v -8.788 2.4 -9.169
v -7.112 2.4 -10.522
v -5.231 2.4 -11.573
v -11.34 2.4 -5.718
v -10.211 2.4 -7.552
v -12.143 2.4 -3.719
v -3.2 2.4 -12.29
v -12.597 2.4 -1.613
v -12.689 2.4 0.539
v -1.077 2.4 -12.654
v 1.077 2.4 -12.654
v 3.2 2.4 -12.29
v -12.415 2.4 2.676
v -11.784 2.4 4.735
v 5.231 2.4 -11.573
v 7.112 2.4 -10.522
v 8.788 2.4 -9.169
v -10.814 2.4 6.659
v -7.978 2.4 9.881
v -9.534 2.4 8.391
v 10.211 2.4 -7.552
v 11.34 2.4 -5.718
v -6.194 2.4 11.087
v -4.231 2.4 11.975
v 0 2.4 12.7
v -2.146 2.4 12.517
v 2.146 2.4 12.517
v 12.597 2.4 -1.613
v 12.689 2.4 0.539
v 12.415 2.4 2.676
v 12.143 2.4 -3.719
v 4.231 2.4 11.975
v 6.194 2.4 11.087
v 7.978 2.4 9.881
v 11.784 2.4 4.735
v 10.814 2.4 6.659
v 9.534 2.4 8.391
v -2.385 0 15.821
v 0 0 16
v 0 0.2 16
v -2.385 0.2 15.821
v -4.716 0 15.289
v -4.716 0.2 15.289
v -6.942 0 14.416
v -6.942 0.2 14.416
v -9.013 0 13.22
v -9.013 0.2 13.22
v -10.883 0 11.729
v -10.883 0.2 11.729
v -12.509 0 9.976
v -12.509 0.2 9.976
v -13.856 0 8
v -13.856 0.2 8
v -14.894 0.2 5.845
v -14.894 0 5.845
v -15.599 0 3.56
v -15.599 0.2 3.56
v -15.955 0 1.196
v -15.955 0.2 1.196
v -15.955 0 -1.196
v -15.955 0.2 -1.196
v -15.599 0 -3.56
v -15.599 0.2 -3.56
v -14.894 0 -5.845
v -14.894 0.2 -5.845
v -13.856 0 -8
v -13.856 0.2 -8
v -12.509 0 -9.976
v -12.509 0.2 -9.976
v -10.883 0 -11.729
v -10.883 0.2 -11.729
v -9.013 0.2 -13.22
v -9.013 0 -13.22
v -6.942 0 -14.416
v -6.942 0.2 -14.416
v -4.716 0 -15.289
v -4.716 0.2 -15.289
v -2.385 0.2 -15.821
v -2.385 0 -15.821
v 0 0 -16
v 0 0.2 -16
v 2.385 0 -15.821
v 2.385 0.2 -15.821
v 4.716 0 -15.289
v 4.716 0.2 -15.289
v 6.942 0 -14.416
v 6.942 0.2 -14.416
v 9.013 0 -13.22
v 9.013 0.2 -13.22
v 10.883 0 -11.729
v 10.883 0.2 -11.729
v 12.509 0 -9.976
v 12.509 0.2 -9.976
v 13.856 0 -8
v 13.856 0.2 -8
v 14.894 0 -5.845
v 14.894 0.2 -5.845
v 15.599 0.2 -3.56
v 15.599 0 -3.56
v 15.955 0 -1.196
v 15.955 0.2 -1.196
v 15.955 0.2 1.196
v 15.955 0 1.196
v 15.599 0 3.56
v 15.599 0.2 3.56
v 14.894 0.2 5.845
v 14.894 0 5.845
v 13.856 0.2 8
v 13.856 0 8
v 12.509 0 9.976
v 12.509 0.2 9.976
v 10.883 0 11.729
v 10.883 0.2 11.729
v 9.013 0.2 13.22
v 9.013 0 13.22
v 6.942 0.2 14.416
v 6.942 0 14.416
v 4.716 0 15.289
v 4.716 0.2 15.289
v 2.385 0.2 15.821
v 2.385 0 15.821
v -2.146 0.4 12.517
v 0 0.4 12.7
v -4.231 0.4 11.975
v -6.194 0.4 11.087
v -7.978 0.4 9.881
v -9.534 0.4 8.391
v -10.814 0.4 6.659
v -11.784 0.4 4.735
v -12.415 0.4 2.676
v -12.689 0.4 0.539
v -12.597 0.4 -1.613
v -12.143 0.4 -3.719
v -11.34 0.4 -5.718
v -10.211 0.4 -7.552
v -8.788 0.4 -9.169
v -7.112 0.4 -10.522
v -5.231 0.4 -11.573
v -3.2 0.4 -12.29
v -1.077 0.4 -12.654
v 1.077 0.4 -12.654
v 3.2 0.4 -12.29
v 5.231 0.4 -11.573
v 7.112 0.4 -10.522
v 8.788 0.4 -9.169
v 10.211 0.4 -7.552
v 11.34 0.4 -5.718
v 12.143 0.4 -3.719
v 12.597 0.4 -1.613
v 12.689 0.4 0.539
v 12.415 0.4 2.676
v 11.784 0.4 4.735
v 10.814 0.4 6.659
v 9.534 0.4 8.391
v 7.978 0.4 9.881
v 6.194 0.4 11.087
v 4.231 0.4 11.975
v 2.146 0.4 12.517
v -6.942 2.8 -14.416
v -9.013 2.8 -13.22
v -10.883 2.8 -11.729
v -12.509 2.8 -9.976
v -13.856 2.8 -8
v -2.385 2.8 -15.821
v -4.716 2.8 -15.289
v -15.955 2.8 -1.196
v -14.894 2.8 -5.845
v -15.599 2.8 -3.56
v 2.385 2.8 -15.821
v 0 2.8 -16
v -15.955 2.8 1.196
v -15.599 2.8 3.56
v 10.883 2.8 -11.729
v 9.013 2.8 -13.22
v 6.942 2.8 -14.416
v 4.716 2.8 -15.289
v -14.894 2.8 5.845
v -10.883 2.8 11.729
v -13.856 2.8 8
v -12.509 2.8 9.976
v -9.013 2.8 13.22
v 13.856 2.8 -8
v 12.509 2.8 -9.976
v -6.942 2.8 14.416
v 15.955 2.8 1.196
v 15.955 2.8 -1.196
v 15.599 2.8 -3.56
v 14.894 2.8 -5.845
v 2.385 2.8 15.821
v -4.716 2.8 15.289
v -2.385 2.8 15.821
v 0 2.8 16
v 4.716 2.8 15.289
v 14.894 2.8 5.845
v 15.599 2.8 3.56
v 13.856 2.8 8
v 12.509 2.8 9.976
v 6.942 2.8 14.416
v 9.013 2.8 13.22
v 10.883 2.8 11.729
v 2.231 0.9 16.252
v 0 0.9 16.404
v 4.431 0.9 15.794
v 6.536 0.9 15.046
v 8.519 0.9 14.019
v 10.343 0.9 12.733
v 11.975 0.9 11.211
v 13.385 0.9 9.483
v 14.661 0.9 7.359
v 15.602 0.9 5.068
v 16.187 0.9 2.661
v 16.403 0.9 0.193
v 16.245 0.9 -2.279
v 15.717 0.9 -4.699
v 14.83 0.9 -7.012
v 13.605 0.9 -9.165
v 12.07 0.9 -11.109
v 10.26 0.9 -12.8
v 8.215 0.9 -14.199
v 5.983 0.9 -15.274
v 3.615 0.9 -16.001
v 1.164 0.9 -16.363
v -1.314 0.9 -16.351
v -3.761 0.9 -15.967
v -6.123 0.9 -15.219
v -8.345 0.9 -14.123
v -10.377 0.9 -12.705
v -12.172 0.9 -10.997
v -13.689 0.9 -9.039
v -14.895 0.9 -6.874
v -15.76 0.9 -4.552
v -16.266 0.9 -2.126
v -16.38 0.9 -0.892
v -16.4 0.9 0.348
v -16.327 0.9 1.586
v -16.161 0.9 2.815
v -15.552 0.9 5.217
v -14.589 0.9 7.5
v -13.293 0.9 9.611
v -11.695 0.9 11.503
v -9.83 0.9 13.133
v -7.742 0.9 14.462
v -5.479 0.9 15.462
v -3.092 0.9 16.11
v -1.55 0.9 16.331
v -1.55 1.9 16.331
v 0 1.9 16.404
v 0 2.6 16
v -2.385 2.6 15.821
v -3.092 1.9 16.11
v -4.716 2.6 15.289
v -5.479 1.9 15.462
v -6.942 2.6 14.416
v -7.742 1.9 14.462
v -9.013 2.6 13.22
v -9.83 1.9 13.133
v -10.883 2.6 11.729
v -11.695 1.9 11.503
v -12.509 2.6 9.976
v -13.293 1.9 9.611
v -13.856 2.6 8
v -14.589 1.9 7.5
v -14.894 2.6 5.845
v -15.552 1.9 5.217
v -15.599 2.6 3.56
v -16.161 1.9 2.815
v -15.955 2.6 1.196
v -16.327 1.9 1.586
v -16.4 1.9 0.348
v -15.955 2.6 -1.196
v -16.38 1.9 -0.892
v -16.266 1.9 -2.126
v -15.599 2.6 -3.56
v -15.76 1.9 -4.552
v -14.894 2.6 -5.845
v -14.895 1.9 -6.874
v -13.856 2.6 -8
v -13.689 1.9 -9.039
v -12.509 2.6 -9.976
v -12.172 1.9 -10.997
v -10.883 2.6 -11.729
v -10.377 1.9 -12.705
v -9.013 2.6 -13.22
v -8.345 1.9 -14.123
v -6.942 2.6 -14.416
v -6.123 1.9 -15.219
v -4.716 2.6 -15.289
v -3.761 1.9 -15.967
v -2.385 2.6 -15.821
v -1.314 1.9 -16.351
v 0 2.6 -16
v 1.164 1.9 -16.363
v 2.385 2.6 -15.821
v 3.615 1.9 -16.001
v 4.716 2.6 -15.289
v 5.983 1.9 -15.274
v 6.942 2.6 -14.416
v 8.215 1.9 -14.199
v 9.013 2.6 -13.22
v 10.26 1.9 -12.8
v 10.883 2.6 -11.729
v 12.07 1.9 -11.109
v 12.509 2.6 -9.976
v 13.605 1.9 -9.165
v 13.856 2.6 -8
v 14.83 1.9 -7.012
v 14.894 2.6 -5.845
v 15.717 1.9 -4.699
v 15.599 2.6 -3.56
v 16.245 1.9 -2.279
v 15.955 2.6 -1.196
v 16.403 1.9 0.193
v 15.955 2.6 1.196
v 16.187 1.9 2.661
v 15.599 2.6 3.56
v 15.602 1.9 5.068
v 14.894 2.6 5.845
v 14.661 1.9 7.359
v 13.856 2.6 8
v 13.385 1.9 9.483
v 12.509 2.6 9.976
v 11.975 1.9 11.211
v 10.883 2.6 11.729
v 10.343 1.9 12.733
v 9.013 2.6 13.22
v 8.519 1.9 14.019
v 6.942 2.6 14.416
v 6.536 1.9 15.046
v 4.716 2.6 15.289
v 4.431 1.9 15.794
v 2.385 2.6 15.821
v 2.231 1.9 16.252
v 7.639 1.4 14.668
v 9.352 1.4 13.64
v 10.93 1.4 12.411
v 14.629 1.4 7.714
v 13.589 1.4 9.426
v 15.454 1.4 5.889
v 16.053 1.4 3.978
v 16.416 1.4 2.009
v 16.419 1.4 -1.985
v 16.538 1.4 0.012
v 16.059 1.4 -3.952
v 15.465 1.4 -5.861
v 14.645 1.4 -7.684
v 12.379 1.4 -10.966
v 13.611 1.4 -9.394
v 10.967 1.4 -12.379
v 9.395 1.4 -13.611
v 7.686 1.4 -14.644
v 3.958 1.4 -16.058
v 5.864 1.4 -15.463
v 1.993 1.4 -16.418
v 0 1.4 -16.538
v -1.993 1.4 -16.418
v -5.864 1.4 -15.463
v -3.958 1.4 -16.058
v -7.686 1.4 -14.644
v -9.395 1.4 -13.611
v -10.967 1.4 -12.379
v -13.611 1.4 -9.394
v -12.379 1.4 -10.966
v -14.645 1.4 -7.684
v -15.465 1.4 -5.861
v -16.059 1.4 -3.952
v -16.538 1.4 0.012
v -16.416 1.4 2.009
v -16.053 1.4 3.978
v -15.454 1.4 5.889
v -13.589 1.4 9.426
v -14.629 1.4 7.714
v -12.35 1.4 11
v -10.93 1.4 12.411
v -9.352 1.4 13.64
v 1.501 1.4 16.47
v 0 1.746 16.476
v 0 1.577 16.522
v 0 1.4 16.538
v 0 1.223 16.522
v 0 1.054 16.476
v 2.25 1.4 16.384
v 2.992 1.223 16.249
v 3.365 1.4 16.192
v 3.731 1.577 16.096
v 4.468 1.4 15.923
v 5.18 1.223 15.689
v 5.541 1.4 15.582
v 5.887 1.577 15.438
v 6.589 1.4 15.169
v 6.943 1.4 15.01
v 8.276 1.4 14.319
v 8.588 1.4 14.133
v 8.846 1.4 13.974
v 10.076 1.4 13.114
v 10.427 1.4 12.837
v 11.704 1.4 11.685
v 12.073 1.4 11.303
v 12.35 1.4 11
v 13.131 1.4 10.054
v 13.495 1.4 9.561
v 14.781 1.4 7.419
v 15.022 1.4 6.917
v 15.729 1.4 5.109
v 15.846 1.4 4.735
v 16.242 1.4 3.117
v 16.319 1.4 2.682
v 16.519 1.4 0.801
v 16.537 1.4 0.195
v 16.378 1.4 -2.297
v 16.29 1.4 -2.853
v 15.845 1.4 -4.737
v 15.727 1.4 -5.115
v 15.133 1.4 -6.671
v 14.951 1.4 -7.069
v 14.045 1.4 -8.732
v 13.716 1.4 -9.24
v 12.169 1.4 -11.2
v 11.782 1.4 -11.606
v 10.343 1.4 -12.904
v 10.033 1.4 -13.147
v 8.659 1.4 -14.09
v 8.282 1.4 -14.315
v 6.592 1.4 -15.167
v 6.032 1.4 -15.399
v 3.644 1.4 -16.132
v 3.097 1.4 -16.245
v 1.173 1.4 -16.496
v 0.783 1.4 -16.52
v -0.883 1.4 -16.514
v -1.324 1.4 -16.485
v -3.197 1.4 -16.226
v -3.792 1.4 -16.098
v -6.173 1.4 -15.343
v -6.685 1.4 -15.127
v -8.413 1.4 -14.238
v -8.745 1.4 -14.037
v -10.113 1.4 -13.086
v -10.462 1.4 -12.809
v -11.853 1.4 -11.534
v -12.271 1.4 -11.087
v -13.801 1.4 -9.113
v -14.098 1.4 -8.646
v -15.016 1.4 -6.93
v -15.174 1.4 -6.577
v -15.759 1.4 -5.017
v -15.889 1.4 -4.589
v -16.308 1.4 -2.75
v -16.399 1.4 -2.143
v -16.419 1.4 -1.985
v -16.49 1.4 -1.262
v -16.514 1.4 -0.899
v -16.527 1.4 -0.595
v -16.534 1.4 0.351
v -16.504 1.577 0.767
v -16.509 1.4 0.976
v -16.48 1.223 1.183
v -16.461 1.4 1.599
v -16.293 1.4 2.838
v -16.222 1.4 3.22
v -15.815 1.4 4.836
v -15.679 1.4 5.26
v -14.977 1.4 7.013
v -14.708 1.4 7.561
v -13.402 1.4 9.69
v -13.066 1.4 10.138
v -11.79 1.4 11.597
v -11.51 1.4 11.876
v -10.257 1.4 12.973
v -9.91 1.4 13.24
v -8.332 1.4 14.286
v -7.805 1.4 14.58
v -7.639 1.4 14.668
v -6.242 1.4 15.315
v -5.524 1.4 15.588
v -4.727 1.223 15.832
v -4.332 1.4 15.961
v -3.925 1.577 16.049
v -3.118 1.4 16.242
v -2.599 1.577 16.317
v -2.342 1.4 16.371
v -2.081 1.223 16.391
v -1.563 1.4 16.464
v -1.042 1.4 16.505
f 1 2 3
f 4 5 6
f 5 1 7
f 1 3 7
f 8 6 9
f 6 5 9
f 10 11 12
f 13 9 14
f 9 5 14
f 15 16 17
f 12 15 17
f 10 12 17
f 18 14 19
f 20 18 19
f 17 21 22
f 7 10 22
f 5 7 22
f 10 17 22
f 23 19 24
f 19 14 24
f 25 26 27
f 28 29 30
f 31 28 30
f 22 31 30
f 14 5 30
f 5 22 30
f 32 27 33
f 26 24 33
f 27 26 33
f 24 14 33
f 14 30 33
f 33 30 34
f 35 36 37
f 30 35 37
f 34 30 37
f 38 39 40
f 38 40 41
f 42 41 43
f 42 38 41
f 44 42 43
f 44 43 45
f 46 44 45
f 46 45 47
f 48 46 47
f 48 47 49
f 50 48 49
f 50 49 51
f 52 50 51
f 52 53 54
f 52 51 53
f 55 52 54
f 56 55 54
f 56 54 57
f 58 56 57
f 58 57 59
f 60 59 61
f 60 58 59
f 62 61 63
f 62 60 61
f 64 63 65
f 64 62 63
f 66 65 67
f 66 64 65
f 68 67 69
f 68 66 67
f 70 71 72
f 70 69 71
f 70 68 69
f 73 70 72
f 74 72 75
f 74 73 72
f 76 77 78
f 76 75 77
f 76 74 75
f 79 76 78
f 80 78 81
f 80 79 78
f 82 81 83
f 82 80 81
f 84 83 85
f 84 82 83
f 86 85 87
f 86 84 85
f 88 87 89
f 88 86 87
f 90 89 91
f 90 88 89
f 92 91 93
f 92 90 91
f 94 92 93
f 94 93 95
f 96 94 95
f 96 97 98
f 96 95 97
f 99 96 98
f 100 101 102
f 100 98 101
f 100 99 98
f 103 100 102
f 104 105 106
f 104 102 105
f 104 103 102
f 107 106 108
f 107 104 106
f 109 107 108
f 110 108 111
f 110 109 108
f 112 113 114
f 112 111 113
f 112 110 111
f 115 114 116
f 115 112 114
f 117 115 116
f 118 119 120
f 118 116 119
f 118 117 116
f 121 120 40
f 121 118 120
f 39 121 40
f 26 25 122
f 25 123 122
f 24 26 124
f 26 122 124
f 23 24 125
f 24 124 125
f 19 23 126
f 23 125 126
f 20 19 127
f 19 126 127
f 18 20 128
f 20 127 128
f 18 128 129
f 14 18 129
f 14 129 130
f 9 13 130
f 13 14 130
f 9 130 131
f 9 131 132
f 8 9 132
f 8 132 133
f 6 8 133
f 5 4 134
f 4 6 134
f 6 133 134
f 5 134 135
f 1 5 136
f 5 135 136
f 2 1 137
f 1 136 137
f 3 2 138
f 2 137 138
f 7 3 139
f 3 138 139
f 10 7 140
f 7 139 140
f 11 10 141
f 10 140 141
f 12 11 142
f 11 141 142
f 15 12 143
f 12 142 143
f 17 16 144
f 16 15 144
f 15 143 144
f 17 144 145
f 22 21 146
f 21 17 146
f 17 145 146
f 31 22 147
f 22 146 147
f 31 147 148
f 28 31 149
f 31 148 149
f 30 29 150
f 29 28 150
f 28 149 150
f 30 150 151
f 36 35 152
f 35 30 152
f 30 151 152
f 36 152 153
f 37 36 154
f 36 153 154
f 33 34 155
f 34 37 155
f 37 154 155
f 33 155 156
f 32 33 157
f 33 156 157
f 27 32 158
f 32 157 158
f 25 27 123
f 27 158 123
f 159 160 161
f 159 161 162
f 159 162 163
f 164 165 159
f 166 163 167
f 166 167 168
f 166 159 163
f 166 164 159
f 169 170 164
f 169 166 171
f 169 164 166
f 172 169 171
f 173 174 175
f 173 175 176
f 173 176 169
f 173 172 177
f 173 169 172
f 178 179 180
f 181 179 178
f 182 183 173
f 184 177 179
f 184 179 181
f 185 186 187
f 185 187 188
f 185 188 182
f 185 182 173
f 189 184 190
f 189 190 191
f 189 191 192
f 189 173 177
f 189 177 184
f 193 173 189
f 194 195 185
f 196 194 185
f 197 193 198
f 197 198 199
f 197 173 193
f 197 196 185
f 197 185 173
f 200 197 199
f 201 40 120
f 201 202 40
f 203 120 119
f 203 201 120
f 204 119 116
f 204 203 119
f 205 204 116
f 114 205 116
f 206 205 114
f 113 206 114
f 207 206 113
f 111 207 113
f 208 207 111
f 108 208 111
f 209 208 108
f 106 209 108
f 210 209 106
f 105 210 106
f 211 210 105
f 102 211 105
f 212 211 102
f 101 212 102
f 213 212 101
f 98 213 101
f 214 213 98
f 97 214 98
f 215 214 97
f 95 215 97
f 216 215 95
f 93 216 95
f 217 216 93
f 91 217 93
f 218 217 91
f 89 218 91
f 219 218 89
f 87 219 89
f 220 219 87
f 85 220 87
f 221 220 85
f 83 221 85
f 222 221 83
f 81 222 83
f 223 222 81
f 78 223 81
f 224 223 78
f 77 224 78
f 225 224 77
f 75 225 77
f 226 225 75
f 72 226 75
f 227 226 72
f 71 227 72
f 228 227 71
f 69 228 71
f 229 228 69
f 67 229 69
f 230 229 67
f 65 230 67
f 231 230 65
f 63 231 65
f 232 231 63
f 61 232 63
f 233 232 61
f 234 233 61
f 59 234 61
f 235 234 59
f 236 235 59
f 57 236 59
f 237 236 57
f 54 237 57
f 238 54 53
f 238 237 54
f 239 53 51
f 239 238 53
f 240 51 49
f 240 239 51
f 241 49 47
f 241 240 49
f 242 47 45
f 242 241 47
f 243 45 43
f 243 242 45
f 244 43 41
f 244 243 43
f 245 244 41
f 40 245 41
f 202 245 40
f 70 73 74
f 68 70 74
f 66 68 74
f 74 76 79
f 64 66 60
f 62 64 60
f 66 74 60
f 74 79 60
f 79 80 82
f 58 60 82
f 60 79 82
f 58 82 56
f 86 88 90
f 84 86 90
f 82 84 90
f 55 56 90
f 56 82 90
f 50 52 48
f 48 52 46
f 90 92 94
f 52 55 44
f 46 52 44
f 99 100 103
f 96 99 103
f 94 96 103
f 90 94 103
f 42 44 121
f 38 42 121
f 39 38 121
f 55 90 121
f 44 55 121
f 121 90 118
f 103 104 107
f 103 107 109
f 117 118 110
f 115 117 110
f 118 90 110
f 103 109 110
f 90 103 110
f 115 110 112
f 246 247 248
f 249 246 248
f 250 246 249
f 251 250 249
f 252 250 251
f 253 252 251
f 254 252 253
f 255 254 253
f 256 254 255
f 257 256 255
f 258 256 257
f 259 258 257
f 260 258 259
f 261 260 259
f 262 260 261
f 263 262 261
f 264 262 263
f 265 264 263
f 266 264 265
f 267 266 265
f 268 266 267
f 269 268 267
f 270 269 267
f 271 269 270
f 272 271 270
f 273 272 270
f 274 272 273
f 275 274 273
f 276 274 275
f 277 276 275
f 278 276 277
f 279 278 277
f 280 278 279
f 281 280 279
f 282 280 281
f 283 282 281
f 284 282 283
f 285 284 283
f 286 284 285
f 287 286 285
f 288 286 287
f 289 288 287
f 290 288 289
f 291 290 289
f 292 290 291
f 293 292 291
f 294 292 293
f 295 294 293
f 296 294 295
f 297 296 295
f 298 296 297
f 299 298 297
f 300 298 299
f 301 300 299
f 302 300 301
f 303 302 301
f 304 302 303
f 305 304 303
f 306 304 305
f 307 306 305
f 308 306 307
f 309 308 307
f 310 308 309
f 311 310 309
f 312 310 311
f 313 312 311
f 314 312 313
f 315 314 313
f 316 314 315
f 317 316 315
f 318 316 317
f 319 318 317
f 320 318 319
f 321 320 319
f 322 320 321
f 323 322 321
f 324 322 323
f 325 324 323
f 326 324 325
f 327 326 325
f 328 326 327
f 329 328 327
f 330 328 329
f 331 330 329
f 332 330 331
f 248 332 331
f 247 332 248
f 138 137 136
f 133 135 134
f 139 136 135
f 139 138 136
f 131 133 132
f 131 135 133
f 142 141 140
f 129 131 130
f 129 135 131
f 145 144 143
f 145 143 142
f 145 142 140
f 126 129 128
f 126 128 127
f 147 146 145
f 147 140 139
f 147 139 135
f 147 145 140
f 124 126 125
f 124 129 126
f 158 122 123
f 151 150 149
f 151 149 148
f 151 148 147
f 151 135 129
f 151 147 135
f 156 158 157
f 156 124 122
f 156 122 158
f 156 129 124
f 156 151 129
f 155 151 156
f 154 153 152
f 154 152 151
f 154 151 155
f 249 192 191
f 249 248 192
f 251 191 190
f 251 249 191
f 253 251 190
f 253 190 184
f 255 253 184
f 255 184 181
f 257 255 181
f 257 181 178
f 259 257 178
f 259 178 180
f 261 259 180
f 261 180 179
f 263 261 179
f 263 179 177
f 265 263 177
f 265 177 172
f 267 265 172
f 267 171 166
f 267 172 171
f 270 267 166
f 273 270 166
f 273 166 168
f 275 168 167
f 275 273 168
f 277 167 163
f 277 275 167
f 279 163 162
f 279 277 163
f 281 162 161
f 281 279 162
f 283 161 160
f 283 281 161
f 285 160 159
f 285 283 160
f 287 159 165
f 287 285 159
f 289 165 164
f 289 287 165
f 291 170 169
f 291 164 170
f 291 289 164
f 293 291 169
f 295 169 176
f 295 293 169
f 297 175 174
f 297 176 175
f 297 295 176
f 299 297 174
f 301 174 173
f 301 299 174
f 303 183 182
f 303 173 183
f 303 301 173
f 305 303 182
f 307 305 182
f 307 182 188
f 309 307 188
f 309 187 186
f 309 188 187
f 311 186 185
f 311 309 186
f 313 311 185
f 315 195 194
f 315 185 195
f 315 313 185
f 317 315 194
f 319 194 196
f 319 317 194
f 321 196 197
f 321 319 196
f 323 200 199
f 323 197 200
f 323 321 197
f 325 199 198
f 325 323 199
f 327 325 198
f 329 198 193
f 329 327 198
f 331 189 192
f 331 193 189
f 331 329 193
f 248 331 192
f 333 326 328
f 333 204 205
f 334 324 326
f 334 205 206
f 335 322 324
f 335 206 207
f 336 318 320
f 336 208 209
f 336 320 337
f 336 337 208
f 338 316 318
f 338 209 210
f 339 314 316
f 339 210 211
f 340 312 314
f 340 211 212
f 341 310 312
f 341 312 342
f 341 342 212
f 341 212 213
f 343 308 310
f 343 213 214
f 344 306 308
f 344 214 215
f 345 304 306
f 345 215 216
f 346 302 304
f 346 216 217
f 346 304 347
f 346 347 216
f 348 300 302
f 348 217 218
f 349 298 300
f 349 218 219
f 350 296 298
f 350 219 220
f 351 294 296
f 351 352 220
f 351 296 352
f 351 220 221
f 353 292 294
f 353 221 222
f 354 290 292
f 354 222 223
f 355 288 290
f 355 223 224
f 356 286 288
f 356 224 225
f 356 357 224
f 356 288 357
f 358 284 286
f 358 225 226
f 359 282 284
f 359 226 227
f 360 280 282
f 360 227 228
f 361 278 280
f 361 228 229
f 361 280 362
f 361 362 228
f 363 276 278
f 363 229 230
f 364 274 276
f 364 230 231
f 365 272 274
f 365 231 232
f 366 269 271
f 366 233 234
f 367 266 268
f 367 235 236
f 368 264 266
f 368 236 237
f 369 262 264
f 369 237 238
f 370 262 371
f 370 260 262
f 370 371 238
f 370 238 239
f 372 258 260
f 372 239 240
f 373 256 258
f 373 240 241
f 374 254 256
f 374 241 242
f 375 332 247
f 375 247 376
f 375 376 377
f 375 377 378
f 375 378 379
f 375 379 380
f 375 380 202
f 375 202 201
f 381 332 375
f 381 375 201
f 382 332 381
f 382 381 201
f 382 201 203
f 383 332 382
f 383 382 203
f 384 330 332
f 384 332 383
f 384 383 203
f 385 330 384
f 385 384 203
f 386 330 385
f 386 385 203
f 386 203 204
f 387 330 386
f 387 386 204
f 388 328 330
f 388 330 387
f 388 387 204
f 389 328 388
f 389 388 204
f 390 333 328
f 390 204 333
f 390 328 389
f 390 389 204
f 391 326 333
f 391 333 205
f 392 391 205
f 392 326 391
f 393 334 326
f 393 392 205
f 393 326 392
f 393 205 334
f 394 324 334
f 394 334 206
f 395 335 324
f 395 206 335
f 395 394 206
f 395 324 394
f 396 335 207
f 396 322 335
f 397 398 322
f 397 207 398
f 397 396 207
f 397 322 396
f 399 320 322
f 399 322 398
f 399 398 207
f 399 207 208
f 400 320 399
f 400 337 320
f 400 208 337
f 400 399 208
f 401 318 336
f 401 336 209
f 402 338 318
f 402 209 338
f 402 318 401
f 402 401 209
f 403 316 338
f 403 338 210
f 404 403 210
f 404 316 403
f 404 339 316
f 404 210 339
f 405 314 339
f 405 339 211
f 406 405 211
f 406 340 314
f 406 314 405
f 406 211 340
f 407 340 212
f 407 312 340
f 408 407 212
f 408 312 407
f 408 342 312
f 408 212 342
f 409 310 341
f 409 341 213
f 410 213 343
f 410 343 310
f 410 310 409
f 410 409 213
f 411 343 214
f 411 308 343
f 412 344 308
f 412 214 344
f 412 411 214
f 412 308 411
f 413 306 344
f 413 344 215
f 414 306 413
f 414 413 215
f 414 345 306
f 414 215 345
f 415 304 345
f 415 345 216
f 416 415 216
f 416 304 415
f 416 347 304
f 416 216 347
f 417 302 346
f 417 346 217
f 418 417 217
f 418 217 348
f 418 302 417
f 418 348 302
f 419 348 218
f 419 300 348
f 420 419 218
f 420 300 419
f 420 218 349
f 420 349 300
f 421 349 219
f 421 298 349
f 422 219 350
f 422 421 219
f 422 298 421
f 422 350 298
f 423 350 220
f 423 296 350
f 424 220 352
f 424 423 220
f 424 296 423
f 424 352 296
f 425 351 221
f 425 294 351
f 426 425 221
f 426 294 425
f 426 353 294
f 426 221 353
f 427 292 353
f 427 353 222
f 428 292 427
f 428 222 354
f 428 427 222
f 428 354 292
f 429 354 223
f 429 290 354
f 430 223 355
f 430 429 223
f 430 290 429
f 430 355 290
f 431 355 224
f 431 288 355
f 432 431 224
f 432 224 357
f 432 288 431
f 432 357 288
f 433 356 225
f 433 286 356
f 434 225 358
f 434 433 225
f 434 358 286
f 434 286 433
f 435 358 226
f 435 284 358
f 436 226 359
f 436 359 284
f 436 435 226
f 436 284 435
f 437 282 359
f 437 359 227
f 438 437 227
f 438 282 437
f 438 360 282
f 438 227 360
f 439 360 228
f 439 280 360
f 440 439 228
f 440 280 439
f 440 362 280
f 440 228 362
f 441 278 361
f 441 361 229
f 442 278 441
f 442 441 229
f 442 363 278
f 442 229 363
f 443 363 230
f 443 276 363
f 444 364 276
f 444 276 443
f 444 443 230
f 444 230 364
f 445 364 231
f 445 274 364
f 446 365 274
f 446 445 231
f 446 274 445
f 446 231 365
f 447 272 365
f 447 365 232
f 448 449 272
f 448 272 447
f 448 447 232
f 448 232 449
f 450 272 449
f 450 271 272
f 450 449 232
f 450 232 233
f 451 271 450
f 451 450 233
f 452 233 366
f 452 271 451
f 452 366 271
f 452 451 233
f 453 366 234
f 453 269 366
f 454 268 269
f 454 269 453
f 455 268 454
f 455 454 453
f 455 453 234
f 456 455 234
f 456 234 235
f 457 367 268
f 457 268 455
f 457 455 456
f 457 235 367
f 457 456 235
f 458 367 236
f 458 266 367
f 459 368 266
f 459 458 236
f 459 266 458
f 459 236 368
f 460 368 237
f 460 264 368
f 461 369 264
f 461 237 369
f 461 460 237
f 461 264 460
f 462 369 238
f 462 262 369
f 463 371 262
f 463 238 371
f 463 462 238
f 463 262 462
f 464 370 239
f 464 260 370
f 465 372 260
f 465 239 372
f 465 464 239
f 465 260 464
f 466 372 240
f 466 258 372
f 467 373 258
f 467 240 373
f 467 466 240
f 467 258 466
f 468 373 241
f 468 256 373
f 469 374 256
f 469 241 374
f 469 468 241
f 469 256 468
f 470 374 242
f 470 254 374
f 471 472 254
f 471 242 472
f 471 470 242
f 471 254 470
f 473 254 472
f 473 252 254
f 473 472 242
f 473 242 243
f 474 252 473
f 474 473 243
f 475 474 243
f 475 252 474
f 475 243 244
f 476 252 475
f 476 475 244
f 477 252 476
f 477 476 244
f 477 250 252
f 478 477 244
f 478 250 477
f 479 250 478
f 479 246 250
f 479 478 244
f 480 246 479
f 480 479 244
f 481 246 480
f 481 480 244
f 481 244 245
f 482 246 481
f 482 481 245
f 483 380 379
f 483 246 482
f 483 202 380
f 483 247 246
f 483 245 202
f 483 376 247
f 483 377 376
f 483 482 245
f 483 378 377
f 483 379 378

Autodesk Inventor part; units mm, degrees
ref_plane "YZ Plane" through (0, 0, 0) normal (1, 0, 0) x (0, 1, 0)
ref_plane "XZ Plane" through (0, 0, 0) normal (0, 1, 0) x (-1, 0, 0)
ref_plane "XY Plane" through (0, 0, 0) normal (0, 0, 1) x (1, 0, 0)
sketch "Sketch1" plane through (0, 0, 0) normal (1, 0, 0) x (0, 1, 0)
  line L0 (2.8, 16) -> (0, 16)
  line L1 (0, 16) -> (0, -16)
  line L2 (0, -16) -> (2.8, -16)
  line L3 (2.8, -16) -> (2.8, 16)
  line L4 (2.4, 12.7) -> (0.4, 12.7)
  line L5 (0.4, 12.7) -> (0.4, -12.7)
  line L6 (0.4, -12.7) -> (2.4, -12.7)
  line L7 (2.4, -12.7) -> (2.4, 12.7)
  line L8 (0, 0) -> (2.8, 0)
  line L9 (0.2, 16) -> (1.4, 16.6928)
  line L10 (1.4, 16.6928) -> (2.6, 16)
  line L11 (1.4, 16.6928) -> (1.4, 12.7) construction
  point P0 (0.4, 0)
  point P1 (2.4, 0)
  dimension "d0" = 0.4
  dimension "d1" = 0.4
  dimension "d2" = 2
  dimension "d4" = 32
  dimension "d5" = 25.4
  dimension "d6" = 240
  dimension "d8" = 0.2
  dimension "d14" = 0.2
revolve "Revolution1" add sketch "Sketch1" angle 360 about axis through (0, 0, 0) along (0, 1, 0) contours L3 L8 L7 L4 L5 L1 L0 | L0 L9 L10
chamfer "Chamfer1" [suppressed]
fillet "Fillet1" radius 1 1 edges at (0, 1.4, -16.6928)
equation "\"d14\" = d8"
properties part number "Game-Piece"
